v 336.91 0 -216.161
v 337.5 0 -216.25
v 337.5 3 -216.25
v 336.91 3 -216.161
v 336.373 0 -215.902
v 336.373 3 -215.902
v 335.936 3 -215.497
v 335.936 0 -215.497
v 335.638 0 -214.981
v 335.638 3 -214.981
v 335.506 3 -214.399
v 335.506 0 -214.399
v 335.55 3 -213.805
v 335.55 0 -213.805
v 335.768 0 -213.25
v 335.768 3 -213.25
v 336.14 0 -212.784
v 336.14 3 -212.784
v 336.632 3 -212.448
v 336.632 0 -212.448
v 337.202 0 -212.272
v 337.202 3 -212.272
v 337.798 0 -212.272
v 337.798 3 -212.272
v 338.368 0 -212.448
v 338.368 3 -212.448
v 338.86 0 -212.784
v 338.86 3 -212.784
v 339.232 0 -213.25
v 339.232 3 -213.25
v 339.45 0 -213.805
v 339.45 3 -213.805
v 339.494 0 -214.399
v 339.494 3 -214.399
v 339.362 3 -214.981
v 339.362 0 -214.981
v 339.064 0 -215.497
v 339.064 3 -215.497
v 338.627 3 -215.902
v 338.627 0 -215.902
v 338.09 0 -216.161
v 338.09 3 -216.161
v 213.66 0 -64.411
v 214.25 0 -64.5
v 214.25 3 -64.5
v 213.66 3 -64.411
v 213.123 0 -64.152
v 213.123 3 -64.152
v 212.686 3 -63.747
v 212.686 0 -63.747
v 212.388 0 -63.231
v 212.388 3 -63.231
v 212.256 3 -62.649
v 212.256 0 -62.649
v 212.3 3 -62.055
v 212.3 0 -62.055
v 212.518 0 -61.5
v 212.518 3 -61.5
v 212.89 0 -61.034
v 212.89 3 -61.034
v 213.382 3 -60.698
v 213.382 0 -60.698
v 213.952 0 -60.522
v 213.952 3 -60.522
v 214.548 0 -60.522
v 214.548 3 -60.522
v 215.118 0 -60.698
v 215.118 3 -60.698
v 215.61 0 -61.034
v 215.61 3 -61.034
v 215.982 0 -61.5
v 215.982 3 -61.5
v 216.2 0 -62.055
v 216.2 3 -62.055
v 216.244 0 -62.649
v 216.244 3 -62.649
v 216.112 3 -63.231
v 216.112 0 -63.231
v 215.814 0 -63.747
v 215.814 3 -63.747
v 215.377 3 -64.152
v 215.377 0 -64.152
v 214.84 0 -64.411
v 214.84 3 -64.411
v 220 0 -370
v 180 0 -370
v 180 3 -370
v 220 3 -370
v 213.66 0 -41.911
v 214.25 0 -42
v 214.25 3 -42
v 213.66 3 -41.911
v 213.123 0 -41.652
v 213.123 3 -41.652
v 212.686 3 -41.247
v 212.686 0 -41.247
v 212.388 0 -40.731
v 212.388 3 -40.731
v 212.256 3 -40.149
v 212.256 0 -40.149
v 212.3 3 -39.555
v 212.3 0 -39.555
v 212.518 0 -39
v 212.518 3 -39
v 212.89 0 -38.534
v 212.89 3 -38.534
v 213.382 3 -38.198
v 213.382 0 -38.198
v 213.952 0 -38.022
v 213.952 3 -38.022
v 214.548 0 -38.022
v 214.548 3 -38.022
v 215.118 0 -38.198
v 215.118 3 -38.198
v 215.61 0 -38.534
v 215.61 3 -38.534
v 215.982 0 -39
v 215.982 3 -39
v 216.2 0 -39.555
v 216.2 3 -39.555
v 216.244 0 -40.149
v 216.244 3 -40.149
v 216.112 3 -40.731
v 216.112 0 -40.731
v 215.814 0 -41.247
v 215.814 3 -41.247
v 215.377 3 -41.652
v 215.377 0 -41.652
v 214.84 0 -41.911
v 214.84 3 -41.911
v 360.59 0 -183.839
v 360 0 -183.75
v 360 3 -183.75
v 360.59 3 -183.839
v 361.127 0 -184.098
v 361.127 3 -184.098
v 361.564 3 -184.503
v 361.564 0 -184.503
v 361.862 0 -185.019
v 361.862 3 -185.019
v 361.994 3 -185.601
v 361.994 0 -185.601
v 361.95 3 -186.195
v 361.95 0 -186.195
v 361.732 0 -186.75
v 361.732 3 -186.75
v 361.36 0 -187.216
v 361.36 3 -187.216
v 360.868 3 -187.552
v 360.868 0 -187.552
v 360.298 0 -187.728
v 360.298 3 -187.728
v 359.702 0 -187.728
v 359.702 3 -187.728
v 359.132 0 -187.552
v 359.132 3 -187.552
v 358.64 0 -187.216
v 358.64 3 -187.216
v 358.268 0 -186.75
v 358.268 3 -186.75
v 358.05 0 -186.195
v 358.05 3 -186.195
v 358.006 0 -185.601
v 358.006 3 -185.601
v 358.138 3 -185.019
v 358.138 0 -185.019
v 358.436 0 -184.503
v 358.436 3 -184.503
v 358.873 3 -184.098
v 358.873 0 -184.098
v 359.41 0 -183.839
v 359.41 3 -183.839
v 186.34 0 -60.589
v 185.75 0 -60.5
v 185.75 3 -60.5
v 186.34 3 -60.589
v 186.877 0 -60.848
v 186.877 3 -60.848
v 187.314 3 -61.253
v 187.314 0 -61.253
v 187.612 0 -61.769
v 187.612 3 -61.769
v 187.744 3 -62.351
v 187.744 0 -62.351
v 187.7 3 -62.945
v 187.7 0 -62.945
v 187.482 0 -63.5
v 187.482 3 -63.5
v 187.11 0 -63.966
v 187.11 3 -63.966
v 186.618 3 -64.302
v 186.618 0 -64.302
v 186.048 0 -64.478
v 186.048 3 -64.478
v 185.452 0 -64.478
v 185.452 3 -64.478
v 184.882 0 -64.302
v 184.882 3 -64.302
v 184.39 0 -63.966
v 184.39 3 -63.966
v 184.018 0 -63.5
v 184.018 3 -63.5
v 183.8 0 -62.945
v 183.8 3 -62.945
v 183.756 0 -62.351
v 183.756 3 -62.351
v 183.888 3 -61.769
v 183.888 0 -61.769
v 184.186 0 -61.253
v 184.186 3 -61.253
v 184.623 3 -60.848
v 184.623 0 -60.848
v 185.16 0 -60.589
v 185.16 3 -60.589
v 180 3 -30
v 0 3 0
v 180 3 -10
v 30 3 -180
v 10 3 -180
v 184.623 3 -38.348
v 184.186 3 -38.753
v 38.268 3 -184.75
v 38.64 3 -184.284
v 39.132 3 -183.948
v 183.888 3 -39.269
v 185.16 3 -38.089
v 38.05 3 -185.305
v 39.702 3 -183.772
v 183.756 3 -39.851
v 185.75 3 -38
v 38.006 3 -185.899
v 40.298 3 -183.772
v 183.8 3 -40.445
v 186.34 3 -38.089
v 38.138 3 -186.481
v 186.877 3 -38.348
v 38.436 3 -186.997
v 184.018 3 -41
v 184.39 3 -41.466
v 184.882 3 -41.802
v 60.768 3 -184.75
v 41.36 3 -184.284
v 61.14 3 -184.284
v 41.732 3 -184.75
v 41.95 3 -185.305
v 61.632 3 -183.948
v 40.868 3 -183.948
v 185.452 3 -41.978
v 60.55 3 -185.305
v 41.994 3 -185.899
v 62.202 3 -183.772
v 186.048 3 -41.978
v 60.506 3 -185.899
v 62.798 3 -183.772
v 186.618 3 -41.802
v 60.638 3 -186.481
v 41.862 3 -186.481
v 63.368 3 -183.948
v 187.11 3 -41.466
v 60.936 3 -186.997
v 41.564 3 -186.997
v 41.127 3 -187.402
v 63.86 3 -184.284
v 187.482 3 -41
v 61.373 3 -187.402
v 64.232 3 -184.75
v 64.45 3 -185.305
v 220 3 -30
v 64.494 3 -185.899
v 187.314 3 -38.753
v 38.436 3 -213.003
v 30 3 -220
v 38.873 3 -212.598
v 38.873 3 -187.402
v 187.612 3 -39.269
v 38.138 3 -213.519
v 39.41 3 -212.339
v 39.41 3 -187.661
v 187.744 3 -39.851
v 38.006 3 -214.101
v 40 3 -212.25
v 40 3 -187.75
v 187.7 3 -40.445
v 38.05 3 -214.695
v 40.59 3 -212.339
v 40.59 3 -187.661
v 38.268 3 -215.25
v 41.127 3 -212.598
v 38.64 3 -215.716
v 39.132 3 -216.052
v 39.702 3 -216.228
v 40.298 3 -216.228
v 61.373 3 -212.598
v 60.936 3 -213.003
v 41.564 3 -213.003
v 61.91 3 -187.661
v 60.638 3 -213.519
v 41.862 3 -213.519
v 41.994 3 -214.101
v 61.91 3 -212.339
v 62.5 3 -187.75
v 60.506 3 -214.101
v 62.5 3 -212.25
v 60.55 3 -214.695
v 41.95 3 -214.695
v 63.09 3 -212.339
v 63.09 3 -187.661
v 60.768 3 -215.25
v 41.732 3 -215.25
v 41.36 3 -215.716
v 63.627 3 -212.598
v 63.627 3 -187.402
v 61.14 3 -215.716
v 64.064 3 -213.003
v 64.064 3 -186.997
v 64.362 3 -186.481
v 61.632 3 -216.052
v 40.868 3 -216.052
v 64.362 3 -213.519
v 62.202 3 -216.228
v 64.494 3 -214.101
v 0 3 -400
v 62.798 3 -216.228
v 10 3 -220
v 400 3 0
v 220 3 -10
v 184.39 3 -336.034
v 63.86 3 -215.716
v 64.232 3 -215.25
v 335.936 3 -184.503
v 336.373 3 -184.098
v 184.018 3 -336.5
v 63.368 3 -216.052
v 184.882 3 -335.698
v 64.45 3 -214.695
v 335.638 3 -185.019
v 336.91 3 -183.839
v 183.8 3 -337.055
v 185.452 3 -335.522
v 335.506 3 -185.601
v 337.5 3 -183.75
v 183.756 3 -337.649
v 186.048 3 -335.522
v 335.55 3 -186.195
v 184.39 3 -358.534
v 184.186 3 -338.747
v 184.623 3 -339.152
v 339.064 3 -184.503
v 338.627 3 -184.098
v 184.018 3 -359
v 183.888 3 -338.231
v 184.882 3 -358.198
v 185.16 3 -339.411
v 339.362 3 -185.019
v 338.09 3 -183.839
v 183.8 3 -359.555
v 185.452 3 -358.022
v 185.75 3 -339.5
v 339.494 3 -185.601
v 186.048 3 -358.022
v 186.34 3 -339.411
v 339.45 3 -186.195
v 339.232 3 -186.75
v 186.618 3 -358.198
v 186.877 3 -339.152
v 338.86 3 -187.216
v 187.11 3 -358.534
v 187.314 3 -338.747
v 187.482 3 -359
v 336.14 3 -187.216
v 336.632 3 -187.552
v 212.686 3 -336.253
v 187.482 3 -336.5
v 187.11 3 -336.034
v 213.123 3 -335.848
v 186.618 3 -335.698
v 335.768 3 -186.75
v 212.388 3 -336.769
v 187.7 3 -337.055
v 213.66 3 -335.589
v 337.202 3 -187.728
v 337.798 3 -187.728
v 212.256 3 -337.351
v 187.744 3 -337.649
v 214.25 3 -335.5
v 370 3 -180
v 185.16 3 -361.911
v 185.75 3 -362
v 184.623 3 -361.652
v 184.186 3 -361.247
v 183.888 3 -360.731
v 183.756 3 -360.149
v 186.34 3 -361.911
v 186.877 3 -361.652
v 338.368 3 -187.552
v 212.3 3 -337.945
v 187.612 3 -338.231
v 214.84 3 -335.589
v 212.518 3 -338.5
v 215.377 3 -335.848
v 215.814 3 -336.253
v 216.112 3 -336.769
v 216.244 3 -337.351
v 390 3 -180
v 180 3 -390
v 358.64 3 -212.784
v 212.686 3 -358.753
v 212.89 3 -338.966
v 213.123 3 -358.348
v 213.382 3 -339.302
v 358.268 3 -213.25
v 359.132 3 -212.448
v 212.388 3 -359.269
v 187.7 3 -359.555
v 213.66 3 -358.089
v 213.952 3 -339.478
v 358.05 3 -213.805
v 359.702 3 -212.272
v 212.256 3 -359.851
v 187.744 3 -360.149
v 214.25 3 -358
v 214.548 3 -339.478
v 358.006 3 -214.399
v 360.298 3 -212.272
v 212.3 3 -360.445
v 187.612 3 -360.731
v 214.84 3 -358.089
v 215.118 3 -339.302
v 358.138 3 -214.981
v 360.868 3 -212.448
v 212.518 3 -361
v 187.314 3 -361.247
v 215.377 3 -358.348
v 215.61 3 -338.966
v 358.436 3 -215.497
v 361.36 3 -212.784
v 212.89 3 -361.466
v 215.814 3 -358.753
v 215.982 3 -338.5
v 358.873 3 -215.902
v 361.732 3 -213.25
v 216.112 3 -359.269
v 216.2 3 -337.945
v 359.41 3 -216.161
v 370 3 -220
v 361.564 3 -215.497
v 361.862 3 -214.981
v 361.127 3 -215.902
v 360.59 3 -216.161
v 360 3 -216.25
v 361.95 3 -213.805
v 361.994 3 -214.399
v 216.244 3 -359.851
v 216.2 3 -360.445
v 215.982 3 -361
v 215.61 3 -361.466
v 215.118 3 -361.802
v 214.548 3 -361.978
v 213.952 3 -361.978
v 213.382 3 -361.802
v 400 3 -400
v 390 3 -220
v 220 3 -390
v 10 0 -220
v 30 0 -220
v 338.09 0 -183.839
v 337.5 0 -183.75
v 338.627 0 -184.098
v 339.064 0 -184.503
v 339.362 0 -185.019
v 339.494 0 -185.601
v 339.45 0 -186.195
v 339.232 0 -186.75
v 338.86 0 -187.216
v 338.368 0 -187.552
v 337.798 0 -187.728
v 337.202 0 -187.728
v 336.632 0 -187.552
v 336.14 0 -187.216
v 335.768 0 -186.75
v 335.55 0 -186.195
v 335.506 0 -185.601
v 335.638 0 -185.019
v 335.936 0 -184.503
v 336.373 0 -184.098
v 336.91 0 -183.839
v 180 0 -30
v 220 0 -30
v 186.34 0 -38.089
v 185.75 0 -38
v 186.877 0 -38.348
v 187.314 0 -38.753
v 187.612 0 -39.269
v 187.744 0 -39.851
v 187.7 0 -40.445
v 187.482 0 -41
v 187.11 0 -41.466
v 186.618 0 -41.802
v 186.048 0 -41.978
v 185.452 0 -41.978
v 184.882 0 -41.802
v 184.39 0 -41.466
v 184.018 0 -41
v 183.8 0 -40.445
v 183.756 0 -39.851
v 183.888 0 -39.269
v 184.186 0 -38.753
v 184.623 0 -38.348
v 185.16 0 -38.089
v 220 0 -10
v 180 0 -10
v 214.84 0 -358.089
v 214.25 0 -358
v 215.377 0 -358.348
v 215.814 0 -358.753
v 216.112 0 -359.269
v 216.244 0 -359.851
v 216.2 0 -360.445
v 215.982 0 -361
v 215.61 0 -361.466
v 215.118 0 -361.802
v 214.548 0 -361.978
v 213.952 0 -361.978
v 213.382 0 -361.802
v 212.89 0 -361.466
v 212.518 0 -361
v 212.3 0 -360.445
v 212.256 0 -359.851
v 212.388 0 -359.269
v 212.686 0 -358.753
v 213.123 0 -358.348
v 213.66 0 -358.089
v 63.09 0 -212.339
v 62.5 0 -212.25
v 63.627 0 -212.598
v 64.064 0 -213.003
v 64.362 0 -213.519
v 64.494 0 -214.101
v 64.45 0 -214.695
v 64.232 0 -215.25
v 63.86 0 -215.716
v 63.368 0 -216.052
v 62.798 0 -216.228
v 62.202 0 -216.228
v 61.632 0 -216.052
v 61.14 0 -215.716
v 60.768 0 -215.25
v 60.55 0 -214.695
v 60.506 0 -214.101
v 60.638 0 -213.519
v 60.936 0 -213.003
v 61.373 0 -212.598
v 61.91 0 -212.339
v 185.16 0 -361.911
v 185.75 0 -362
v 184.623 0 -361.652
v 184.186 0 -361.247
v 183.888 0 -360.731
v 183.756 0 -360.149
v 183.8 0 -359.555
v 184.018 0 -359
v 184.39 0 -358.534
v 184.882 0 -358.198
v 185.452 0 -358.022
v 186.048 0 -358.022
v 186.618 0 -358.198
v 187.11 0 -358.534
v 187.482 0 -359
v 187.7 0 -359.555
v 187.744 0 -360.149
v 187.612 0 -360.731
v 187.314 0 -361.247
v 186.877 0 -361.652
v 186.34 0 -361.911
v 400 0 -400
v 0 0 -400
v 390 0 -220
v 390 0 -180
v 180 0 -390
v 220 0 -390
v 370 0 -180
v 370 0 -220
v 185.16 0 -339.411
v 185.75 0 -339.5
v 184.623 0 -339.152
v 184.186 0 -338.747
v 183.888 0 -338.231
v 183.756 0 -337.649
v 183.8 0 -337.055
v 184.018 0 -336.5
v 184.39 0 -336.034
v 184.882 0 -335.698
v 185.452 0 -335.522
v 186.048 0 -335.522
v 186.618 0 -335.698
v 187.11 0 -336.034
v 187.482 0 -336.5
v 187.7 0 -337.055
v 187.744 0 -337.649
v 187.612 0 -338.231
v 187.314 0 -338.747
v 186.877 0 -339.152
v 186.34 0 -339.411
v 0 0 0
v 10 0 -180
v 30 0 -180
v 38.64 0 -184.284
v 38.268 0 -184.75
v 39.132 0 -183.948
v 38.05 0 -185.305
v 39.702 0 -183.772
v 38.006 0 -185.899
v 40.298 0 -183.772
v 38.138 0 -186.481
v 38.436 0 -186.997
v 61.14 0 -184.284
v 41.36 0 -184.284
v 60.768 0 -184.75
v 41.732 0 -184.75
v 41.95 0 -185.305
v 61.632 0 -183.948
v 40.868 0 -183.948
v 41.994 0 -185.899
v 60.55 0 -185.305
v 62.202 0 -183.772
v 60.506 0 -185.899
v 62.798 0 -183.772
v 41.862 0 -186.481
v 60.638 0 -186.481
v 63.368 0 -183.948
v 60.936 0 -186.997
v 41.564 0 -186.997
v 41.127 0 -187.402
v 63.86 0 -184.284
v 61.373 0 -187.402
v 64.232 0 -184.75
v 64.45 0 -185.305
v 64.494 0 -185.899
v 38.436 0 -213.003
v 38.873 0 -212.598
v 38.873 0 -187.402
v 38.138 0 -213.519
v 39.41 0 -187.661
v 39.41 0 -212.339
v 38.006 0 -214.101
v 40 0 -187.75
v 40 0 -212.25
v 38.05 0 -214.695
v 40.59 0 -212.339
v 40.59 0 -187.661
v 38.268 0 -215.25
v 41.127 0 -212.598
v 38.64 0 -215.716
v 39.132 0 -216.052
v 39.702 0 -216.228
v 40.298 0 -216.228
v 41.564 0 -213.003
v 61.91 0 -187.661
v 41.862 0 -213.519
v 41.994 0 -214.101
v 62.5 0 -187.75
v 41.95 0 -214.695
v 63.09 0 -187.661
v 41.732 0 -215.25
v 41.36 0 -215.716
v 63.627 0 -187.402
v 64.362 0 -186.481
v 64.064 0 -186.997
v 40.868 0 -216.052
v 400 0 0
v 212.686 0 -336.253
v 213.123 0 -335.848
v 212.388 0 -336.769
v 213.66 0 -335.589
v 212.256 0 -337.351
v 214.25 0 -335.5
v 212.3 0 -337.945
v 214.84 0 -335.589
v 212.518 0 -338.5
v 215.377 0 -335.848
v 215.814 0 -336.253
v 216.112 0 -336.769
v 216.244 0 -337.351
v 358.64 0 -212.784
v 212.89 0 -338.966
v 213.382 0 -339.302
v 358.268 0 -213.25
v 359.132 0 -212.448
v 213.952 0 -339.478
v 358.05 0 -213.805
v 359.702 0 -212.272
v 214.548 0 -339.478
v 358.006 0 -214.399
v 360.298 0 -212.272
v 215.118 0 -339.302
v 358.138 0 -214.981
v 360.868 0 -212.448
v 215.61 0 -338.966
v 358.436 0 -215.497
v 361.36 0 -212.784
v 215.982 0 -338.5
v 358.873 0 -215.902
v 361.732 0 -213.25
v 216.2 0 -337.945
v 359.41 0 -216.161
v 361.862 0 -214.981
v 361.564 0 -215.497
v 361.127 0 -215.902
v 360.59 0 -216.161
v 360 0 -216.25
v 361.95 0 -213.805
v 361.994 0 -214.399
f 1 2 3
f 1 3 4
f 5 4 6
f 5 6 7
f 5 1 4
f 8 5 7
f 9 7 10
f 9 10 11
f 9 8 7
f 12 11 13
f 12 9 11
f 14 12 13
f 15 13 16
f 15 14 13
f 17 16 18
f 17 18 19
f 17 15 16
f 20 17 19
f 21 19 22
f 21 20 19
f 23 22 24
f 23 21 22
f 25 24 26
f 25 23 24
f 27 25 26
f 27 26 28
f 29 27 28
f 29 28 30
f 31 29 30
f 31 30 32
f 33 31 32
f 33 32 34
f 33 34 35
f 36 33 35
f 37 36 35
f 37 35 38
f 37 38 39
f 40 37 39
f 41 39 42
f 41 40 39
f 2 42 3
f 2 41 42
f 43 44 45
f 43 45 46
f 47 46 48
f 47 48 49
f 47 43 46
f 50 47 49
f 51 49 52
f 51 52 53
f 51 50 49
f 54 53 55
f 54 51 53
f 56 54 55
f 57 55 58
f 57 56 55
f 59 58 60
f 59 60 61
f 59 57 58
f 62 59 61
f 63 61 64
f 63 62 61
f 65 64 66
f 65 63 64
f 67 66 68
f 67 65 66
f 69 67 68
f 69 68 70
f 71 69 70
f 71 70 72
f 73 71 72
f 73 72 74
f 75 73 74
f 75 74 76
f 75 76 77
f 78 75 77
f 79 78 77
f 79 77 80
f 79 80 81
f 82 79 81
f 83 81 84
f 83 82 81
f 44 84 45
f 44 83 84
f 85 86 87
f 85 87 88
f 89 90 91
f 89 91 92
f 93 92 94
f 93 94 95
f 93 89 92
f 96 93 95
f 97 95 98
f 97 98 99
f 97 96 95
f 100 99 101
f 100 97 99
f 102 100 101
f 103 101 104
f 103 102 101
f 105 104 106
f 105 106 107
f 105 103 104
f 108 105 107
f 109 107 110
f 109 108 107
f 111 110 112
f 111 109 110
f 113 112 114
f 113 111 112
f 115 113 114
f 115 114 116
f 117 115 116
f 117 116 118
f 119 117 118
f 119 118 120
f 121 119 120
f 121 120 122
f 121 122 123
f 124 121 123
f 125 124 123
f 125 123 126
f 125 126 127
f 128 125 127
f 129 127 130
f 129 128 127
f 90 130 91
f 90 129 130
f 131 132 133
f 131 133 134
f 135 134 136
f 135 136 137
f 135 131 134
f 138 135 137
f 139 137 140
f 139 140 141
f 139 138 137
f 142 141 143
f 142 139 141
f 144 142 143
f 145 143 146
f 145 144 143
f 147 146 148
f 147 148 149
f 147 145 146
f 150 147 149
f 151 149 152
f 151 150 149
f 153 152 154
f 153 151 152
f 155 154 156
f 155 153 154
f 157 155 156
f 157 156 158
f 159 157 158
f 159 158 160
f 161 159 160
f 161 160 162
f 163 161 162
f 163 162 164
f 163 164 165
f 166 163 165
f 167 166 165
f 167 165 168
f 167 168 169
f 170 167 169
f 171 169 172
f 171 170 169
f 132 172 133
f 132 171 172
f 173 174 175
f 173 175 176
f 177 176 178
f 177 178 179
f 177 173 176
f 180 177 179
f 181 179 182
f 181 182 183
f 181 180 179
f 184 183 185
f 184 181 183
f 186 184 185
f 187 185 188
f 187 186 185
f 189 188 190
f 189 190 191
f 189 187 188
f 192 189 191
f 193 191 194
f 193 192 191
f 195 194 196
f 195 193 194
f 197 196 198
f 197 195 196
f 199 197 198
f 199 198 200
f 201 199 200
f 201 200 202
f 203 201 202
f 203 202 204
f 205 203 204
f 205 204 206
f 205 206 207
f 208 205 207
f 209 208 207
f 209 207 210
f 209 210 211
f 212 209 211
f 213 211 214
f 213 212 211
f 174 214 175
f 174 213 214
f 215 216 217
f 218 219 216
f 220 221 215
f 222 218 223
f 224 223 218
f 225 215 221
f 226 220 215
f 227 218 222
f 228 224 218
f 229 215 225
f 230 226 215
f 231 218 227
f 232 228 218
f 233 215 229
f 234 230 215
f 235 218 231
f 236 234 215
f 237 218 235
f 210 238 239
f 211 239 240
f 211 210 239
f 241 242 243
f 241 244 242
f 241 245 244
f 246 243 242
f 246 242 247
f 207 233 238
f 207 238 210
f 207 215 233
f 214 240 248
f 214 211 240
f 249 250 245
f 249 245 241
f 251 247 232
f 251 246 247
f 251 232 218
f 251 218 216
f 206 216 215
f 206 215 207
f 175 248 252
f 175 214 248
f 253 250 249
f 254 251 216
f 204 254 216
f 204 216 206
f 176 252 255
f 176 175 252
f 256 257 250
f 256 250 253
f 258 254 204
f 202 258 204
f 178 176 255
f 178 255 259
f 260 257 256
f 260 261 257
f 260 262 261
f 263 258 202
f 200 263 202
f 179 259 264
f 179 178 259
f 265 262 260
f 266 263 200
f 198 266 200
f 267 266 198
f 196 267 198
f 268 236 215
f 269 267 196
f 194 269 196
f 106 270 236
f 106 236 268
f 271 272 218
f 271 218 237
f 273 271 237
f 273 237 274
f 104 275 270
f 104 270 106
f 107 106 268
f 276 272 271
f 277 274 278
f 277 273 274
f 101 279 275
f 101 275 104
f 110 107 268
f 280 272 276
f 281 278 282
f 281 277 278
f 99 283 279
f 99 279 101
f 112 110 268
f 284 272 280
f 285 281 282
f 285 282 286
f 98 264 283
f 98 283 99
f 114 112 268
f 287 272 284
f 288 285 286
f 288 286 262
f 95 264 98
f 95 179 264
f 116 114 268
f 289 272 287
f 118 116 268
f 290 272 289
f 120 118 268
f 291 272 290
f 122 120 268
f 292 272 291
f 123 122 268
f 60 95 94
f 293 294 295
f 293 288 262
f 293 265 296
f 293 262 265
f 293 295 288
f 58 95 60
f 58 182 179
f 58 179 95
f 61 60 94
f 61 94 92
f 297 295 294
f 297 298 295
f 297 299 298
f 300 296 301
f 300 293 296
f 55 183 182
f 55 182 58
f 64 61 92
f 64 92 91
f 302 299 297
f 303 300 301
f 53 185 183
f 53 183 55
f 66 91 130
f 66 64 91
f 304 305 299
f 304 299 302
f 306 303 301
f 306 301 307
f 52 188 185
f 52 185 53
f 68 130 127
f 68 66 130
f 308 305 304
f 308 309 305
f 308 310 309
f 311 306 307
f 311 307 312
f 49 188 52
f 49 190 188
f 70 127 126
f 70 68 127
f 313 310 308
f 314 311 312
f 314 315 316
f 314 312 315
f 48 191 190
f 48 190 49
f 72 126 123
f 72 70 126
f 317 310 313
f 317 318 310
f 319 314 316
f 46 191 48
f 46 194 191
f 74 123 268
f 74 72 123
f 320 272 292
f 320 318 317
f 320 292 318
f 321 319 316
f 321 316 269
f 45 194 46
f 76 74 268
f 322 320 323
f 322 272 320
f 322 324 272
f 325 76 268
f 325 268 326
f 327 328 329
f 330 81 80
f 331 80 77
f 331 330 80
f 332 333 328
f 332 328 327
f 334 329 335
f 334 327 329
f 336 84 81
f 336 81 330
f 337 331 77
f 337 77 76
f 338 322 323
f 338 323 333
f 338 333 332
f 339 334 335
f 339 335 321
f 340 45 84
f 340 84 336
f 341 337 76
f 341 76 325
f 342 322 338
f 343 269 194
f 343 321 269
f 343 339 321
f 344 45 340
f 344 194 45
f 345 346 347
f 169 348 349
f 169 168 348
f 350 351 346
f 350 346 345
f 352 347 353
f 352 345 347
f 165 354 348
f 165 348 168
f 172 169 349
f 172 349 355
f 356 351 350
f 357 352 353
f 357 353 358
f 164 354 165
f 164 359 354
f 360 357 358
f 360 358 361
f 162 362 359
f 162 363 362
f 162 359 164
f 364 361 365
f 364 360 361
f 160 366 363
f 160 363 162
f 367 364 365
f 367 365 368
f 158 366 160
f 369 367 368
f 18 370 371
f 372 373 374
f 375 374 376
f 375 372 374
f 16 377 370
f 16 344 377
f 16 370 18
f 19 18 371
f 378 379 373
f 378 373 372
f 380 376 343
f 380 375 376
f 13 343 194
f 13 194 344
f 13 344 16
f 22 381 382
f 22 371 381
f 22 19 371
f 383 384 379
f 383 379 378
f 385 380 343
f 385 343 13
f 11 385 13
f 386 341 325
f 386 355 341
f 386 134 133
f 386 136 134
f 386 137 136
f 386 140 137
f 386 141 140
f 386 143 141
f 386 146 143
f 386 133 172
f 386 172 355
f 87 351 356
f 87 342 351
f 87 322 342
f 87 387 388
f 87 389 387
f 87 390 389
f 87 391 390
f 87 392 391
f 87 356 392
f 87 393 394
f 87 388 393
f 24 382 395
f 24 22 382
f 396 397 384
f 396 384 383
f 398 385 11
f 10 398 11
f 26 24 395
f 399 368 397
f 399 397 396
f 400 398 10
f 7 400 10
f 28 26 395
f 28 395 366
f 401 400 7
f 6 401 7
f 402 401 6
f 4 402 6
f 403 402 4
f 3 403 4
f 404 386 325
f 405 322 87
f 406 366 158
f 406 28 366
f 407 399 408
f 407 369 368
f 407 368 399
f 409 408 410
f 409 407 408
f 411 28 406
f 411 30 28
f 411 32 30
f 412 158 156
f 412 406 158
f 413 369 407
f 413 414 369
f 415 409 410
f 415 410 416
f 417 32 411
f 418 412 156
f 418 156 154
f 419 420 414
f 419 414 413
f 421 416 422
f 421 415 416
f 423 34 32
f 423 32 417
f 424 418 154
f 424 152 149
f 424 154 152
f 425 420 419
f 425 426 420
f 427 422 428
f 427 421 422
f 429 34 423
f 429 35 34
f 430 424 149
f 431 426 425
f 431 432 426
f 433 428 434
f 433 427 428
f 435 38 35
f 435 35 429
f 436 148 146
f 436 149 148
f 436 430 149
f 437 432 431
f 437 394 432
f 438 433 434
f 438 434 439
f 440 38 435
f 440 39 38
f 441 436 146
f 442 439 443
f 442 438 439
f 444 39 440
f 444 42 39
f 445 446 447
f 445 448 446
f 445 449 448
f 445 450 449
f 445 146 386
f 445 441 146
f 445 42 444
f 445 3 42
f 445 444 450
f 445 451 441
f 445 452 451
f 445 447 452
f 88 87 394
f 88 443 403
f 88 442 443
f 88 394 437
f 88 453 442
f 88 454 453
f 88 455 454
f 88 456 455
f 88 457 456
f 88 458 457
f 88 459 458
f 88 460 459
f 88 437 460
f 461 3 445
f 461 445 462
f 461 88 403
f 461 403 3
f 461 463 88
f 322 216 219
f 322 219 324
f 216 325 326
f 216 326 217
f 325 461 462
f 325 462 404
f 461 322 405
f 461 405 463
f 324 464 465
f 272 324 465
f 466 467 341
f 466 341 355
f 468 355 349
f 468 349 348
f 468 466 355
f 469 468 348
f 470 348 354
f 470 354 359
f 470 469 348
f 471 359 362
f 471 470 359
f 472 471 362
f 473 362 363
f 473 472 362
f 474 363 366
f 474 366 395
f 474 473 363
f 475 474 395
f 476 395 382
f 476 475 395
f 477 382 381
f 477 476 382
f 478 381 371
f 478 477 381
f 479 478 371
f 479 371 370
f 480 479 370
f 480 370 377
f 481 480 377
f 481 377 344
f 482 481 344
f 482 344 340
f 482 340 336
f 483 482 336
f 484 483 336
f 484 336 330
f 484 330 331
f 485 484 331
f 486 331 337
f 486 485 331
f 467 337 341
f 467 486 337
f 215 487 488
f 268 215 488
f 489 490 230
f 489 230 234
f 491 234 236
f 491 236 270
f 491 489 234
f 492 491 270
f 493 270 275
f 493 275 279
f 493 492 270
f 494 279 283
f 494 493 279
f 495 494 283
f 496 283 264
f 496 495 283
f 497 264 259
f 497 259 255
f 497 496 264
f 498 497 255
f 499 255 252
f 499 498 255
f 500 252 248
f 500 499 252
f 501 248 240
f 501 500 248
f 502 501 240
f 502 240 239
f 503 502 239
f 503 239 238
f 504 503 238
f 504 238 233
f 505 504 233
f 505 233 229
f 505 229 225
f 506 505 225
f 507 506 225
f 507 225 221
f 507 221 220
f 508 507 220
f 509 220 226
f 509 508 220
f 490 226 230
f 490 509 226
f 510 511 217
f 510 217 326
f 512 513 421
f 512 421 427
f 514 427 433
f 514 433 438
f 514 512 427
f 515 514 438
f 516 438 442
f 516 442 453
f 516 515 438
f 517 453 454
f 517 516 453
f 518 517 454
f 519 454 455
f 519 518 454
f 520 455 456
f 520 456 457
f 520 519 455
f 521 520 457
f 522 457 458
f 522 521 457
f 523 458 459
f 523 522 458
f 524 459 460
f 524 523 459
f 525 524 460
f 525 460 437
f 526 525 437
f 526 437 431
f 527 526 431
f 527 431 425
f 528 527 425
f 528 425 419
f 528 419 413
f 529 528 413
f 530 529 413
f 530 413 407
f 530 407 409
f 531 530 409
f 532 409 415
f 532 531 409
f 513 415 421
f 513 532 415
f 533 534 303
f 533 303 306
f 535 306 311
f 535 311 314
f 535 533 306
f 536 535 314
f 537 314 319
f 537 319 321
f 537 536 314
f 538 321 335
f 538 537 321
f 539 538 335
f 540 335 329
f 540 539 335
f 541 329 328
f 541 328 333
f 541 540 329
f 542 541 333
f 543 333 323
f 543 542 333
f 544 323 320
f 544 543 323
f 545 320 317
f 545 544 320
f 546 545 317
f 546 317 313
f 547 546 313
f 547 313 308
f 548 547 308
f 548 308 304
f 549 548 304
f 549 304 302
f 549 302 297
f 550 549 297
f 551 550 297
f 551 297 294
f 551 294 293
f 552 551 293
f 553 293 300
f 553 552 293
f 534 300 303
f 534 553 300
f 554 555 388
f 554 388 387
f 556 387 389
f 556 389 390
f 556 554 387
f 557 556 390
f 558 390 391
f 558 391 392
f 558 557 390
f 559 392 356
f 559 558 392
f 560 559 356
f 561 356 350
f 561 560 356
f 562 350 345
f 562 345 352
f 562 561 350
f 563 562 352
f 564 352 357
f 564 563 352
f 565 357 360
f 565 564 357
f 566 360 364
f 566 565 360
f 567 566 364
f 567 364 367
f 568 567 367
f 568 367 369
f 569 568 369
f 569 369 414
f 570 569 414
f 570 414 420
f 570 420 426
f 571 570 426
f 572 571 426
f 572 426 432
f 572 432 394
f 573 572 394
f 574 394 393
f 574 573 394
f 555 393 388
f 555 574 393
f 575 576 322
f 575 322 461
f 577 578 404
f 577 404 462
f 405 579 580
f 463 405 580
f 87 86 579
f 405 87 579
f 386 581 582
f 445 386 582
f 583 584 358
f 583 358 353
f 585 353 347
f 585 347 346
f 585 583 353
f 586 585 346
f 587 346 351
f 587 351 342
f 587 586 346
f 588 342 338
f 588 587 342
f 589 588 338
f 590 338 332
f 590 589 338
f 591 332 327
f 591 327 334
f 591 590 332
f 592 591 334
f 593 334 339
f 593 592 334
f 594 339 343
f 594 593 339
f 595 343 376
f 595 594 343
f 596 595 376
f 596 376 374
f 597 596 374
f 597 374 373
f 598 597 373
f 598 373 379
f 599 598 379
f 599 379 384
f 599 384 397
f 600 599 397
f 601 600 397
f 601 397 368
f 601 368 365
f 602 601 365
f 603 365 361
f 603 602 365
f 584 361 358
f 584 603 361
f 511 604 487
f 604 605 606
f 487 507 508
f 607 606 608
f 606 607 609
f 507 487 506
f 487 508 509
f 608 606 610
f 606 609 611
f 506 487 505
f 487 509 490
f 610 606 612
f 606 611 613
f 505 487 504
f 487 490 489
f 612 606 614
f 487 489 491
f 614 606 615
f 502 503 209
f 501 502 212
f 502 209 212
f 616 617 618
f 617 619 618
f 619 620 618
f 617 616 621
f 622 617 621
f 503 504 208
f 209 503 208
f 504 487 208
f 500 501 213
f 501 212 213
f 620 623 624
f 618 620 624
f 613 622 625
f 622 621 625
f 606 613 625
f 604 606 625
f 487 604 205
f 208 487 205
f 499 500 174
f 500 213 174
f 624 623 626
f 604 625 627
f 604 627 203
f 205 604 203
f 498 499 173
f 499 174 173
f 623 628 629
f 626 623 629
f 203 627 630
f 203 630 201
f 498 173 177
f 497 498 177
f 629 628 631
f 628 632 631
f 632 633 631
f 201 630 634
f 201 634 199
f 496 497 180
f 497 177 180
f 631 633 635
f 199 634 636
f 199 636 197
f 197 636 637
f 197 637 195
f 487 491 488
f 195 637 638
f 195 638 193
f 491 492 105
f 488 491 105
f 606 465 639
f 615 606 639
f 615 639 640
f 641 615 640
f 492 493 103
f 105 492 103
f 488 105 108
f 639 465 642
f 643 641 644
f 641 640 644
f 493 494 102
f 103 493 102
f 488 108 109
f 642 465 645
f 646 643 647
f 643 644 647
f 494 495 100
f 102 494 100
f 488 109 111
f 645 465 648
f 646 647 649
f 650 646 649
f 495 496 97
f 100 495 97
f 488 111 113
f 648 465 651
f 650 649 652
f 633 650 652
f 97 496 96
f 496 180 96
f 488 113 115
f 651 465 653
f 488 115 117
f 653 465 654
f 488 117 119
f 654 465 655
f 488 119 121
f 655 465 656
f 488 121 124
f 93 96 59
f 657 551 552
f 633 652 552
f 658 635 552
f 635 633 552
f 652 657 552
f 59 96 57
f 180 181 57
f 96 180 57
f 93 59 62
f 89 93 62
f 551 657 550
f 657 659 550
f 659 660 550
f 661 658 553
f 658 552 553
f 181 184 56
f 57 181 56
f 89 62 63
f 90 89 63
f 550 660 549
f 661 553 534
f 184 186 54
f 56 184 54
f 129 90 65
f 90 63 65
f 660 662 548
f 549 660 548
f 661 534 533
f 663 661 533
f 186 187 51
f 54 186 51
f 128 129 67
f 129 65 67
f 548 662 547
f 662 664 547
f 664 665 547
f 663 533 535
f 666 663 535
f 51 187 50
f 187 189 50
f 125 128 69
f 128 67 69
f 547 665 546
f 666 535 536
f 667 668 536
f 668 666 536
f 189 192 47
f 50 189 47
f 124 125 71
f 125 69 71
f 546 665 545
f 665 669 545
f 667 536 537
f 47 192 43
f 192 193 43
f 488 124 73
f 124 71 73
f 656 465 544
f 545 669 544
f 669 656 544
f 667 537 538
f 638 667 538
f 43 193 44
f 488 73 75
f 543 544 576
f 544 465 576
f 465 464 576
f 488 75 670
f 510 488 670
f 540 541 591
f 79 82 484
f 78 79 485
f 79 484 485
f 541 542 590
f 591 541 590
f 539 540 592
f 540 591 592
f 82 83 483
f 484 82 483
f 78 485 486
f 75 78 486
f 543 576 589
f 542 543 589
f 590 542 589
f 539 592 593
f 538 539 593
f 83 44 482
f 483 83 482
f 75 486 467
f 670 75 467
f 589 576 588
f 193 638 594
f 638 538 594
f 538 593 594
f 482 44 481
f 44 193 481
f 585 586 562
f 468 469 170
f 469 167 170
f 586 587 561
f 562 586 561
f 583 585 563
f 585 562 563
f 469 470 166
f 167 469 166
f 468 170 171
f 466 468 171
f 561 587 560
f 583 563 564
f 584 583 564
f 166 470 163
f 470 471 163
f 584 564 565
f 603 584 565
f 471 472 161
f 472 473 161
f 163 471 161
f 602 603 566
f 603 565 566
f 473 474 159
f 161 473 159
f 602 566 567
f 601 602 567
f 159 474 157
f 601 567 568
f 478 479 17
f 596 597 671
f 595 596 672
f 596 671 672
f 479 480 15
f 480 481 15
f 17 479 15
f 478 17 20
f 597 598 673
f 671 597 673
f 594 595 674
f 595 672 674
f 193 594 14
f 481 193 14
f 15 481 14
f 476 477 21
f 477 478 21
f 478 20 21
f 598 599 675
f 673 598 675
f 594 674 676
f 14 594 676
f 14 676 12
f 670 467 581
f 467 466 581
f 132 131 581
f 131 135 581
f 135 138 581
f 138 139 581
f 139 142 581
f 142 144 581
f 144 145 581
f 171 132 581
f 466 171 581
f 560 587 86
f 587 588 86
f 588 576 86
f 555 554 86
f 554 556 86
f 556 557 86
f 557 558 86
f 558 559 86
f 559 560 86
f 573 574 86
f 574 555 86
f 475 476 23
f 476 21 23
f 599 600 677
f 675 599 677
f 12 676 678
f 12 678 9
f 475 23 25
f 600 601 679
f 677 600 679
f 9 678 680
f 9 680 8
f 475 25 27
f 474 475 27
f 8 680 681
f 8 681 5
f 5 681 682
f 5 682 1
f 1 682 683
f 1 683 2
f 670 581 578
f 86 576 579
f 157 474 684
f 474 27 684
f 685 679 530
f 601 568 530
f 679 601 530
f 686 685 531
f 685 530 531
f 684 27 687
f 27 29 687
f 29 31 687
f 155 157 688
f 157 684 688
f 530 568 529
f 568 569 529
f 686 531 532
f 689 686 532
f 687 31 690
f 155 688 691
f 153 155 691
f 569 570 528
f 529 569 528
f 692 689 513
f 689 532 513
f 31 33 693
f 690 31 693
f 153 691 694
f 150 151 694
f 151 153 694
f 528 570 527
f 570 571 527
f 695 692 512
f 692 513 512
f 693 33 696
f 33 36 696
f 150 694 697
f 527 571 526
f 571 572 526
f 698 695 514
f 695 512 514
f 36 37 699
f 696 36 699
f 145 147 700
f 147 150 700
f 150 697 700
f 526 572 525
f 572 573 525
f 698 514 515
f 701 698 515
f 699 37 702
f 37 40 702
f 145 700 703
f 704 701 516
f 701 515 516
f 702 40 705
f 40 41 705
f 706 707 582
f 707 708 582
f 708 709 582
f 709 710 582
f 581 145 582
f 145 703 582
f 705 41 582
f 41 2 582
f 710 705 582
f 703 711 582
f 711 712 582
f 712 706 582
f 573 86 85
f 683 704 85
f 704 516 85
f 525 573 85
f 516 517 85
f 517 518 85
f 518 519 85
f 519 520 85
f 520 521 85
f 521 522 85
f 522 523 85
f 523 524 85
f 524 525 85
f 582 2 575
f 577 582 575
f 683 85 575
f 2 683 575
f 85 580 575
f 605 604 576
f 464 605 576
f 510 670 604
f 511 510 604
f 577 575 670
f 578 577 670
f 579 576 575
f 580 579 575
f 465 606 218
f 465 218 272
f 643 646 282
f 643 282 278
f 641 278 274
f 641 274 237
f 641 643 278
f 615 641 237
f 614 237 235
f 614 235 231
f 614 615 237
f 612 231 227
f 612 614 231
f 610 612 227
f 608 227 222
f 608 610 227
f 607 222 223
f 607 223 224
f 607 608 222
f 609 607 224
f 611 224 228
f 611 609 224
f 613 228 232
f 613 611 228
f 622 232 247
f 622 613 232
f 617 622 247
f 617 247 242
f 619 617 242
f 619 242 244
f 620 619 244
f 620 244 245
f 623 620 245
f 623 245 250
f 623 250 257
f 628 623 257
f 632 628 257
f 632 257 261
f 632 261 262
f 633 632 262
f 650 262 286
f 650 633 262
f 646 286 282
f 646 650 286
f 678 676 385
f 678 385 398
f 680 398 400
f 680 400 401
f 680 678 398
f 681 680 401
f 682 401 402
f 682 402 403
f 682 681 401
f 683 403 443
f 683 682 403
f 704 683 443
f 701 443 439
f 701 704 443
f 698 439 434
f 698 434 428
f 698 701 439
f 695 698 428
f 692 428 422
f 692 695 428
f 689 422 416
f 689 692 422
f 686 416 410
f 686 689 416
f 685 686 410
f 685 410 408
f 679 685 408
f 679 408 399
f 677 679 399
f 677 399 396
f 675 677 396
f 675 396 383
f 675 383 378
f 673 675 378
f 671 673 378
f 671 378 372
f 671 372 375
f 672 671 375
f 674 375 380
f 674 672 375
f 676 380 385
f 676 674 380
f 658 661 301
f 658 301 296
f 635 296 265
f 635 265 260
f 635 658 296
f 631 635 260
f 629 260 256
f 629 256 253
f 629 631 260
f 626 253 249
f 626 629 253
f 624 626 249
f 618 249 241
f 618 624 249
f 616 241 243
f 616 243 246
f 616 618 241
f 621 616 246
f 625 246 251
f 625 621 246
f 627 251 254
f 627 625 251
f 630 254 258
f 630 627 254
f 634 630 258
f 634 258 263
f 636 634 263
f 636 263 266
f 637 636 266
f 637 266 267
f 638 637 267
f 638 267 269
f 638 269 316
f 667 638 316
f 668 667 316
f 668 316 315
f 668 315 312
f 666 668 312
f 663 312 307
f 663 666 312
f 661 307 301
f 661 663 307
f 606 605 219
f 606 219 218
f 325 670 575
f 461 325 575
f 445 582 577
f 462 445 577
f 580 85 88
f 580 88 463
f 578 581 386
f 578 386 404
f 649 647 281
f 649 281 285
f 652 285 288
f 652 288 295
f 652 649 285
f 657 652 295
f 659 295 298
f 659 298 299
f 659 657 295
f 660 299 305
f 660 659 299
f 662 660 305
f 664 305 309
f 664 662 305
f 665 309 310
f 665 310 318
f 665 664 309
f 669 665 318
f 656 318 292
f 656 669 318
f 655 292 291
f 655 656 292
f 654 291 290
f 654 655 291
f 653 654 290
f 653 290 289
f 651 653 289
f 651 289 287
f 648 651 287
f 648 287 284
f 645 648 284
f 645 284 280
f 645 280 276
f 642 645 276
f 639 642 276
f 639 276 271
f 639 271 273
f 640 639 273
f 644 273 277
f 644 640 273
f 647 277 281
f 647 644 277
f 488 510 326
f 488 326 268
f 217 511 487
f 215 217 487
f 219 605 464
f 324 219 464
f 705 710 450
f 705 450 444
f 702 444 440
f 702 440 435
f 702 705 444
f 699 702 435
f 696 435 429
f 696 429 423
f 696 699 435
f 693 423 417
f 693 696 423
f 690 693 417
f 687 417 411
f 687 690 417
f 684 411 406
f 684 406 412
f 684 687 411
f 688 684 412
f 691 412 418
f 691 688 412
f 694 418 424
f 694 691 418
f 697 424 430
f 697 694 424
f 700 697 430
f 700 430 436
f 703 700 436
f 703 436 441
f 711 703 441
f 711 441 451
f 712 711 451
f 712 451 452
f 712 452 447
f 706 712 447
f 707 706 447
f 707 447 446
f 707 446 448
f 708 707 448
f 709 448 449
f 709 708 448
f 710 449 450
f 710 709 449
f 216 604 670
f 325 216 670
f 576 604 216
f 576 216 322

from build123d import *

# Parameters (mm, degrees)
SKETCH1_W      = 400
SKETCH1_H      = 400
SKETCH1_R      = 2
SKETCH1_W_2    = 20
SKETCH1_H_2    = 40
SKETCH1_W_3    = 40
SKETCH1_H_3    = 20
EXTRUDE1_DEPTH = 3


with BuildPart() as part:
    # Sketch1 → Extrude1 (new body)
    with BuildSketch(Plane(origin=(0, 0, 0), x_dir=(1, 0, 0), z_dir=(0, 1, 0))):
        with Locations((200, 200)):
            Rectangle(SKETCH1_W, SKETCH1_H)
        with Locations(Location((185.75, 40, 0), (0, 0, 270))):
            Circle(SKETCH1_R, mode=Mode.SUBTRACT)
        with Locations(Location((185.75, 62.5, 0), (0, 0, 270))):
            Circle(SKETCH1_R, mode=Mode.SUBTRACT)
        with Locations(Location((214.25, 62.5, 0), (0, 0, 90))):
            Circle(SKETCH1_R, mode=Mode.SUBTRACT)
        with Locations(Location((214.25, 40, 0), (0, 0, 90))):
            Circle(SKETCH1_R, mode=Mode.SUBTRACT)
        with Locations(Location((40, 214.25, 0), (0, 0, 270))):
            Circle(SKETCH1_R, mode=Mode.SUBTRACT)
        with Locations(Location((62.5, 214.25, 0), (0, 0, 270))):
            Circle(SKETCH1_R, mode=Mode.SUBTRACT)
        with Locations(Location((62.5, 185.75, 0), (0, 0, 90))):
            Circle(SKETCH1_R, mode=Mode.SUBTRACT)
        with Locations(Location((40, 185.75, 0), (0, 0, 90))):
            Circle(SKETCH1_R, mode=Mode.SUBTRACT)
        with Locations(Location((214.25, 360, 0), (0, 0, 270))):
            Circle(SKETCH1_R, mode=Mode.SUBTRACT)
        with Locations(Location((214.25, 337.5, 0), (0, 0, 270))):
            Circle(SKETCH1_R, mode=Mode.SUBTRACT)
        with Locations(Location((185.75, 337.5, 0), (0, 0, 90))):
            Circle(SKETCH1_R, mode=Mode.SUBTRACT)
        with Locations(Location((185.75, 360, 0), (0, 0, 90))):
            Circle(SKETCH1_R, mode=Mode.SUBTRACT)
        with Locations(Location((360, 185.75, 0), (0, 0, 270))):
            Circle(SKETCH1_R, mode=Mode.SUBTRACT)
        with Locations(Location((337.5, 185.75, 0), (0, 0, 270))):
            Circle(SKETCH1_R, mode=Mode.SUBTRACT)
        with Locations(Location((337.5, 214.25, 0), (0, 0, 90))):
            Circle(SKETCH1_R, mode=Mode.SUBTRACT)
        with Locations(Location((360, 214.25, 0), (0, 0, 90))):
            Circle(SKETCH1_R, mode=Mode.SUBTRACT)
        with Locations((20, 200)):
            Rectangle(SKETCH1_W_2, SKETCH1_H_2, mode=Mode.SUBTRACT)
        with Locations((200, 20)):
            Rectangle(SKETCH1_W_3, SKETCH1_H_3, mode=Mode.SUBTRACT)
        with Locations((200, 380)):
            Rectangle(SKETCH1_W_3, SKETCH1_H_3, mode=Mode.SUBTRACT)
        with Locations((380, 200)):
            Rectangle(SKETCH1_W_2, SKETCH1_H_2, mode=Mode.SUBTRACT)
    extrude(amount=EXTRUDE1_DEPTH)


solid = part.part
